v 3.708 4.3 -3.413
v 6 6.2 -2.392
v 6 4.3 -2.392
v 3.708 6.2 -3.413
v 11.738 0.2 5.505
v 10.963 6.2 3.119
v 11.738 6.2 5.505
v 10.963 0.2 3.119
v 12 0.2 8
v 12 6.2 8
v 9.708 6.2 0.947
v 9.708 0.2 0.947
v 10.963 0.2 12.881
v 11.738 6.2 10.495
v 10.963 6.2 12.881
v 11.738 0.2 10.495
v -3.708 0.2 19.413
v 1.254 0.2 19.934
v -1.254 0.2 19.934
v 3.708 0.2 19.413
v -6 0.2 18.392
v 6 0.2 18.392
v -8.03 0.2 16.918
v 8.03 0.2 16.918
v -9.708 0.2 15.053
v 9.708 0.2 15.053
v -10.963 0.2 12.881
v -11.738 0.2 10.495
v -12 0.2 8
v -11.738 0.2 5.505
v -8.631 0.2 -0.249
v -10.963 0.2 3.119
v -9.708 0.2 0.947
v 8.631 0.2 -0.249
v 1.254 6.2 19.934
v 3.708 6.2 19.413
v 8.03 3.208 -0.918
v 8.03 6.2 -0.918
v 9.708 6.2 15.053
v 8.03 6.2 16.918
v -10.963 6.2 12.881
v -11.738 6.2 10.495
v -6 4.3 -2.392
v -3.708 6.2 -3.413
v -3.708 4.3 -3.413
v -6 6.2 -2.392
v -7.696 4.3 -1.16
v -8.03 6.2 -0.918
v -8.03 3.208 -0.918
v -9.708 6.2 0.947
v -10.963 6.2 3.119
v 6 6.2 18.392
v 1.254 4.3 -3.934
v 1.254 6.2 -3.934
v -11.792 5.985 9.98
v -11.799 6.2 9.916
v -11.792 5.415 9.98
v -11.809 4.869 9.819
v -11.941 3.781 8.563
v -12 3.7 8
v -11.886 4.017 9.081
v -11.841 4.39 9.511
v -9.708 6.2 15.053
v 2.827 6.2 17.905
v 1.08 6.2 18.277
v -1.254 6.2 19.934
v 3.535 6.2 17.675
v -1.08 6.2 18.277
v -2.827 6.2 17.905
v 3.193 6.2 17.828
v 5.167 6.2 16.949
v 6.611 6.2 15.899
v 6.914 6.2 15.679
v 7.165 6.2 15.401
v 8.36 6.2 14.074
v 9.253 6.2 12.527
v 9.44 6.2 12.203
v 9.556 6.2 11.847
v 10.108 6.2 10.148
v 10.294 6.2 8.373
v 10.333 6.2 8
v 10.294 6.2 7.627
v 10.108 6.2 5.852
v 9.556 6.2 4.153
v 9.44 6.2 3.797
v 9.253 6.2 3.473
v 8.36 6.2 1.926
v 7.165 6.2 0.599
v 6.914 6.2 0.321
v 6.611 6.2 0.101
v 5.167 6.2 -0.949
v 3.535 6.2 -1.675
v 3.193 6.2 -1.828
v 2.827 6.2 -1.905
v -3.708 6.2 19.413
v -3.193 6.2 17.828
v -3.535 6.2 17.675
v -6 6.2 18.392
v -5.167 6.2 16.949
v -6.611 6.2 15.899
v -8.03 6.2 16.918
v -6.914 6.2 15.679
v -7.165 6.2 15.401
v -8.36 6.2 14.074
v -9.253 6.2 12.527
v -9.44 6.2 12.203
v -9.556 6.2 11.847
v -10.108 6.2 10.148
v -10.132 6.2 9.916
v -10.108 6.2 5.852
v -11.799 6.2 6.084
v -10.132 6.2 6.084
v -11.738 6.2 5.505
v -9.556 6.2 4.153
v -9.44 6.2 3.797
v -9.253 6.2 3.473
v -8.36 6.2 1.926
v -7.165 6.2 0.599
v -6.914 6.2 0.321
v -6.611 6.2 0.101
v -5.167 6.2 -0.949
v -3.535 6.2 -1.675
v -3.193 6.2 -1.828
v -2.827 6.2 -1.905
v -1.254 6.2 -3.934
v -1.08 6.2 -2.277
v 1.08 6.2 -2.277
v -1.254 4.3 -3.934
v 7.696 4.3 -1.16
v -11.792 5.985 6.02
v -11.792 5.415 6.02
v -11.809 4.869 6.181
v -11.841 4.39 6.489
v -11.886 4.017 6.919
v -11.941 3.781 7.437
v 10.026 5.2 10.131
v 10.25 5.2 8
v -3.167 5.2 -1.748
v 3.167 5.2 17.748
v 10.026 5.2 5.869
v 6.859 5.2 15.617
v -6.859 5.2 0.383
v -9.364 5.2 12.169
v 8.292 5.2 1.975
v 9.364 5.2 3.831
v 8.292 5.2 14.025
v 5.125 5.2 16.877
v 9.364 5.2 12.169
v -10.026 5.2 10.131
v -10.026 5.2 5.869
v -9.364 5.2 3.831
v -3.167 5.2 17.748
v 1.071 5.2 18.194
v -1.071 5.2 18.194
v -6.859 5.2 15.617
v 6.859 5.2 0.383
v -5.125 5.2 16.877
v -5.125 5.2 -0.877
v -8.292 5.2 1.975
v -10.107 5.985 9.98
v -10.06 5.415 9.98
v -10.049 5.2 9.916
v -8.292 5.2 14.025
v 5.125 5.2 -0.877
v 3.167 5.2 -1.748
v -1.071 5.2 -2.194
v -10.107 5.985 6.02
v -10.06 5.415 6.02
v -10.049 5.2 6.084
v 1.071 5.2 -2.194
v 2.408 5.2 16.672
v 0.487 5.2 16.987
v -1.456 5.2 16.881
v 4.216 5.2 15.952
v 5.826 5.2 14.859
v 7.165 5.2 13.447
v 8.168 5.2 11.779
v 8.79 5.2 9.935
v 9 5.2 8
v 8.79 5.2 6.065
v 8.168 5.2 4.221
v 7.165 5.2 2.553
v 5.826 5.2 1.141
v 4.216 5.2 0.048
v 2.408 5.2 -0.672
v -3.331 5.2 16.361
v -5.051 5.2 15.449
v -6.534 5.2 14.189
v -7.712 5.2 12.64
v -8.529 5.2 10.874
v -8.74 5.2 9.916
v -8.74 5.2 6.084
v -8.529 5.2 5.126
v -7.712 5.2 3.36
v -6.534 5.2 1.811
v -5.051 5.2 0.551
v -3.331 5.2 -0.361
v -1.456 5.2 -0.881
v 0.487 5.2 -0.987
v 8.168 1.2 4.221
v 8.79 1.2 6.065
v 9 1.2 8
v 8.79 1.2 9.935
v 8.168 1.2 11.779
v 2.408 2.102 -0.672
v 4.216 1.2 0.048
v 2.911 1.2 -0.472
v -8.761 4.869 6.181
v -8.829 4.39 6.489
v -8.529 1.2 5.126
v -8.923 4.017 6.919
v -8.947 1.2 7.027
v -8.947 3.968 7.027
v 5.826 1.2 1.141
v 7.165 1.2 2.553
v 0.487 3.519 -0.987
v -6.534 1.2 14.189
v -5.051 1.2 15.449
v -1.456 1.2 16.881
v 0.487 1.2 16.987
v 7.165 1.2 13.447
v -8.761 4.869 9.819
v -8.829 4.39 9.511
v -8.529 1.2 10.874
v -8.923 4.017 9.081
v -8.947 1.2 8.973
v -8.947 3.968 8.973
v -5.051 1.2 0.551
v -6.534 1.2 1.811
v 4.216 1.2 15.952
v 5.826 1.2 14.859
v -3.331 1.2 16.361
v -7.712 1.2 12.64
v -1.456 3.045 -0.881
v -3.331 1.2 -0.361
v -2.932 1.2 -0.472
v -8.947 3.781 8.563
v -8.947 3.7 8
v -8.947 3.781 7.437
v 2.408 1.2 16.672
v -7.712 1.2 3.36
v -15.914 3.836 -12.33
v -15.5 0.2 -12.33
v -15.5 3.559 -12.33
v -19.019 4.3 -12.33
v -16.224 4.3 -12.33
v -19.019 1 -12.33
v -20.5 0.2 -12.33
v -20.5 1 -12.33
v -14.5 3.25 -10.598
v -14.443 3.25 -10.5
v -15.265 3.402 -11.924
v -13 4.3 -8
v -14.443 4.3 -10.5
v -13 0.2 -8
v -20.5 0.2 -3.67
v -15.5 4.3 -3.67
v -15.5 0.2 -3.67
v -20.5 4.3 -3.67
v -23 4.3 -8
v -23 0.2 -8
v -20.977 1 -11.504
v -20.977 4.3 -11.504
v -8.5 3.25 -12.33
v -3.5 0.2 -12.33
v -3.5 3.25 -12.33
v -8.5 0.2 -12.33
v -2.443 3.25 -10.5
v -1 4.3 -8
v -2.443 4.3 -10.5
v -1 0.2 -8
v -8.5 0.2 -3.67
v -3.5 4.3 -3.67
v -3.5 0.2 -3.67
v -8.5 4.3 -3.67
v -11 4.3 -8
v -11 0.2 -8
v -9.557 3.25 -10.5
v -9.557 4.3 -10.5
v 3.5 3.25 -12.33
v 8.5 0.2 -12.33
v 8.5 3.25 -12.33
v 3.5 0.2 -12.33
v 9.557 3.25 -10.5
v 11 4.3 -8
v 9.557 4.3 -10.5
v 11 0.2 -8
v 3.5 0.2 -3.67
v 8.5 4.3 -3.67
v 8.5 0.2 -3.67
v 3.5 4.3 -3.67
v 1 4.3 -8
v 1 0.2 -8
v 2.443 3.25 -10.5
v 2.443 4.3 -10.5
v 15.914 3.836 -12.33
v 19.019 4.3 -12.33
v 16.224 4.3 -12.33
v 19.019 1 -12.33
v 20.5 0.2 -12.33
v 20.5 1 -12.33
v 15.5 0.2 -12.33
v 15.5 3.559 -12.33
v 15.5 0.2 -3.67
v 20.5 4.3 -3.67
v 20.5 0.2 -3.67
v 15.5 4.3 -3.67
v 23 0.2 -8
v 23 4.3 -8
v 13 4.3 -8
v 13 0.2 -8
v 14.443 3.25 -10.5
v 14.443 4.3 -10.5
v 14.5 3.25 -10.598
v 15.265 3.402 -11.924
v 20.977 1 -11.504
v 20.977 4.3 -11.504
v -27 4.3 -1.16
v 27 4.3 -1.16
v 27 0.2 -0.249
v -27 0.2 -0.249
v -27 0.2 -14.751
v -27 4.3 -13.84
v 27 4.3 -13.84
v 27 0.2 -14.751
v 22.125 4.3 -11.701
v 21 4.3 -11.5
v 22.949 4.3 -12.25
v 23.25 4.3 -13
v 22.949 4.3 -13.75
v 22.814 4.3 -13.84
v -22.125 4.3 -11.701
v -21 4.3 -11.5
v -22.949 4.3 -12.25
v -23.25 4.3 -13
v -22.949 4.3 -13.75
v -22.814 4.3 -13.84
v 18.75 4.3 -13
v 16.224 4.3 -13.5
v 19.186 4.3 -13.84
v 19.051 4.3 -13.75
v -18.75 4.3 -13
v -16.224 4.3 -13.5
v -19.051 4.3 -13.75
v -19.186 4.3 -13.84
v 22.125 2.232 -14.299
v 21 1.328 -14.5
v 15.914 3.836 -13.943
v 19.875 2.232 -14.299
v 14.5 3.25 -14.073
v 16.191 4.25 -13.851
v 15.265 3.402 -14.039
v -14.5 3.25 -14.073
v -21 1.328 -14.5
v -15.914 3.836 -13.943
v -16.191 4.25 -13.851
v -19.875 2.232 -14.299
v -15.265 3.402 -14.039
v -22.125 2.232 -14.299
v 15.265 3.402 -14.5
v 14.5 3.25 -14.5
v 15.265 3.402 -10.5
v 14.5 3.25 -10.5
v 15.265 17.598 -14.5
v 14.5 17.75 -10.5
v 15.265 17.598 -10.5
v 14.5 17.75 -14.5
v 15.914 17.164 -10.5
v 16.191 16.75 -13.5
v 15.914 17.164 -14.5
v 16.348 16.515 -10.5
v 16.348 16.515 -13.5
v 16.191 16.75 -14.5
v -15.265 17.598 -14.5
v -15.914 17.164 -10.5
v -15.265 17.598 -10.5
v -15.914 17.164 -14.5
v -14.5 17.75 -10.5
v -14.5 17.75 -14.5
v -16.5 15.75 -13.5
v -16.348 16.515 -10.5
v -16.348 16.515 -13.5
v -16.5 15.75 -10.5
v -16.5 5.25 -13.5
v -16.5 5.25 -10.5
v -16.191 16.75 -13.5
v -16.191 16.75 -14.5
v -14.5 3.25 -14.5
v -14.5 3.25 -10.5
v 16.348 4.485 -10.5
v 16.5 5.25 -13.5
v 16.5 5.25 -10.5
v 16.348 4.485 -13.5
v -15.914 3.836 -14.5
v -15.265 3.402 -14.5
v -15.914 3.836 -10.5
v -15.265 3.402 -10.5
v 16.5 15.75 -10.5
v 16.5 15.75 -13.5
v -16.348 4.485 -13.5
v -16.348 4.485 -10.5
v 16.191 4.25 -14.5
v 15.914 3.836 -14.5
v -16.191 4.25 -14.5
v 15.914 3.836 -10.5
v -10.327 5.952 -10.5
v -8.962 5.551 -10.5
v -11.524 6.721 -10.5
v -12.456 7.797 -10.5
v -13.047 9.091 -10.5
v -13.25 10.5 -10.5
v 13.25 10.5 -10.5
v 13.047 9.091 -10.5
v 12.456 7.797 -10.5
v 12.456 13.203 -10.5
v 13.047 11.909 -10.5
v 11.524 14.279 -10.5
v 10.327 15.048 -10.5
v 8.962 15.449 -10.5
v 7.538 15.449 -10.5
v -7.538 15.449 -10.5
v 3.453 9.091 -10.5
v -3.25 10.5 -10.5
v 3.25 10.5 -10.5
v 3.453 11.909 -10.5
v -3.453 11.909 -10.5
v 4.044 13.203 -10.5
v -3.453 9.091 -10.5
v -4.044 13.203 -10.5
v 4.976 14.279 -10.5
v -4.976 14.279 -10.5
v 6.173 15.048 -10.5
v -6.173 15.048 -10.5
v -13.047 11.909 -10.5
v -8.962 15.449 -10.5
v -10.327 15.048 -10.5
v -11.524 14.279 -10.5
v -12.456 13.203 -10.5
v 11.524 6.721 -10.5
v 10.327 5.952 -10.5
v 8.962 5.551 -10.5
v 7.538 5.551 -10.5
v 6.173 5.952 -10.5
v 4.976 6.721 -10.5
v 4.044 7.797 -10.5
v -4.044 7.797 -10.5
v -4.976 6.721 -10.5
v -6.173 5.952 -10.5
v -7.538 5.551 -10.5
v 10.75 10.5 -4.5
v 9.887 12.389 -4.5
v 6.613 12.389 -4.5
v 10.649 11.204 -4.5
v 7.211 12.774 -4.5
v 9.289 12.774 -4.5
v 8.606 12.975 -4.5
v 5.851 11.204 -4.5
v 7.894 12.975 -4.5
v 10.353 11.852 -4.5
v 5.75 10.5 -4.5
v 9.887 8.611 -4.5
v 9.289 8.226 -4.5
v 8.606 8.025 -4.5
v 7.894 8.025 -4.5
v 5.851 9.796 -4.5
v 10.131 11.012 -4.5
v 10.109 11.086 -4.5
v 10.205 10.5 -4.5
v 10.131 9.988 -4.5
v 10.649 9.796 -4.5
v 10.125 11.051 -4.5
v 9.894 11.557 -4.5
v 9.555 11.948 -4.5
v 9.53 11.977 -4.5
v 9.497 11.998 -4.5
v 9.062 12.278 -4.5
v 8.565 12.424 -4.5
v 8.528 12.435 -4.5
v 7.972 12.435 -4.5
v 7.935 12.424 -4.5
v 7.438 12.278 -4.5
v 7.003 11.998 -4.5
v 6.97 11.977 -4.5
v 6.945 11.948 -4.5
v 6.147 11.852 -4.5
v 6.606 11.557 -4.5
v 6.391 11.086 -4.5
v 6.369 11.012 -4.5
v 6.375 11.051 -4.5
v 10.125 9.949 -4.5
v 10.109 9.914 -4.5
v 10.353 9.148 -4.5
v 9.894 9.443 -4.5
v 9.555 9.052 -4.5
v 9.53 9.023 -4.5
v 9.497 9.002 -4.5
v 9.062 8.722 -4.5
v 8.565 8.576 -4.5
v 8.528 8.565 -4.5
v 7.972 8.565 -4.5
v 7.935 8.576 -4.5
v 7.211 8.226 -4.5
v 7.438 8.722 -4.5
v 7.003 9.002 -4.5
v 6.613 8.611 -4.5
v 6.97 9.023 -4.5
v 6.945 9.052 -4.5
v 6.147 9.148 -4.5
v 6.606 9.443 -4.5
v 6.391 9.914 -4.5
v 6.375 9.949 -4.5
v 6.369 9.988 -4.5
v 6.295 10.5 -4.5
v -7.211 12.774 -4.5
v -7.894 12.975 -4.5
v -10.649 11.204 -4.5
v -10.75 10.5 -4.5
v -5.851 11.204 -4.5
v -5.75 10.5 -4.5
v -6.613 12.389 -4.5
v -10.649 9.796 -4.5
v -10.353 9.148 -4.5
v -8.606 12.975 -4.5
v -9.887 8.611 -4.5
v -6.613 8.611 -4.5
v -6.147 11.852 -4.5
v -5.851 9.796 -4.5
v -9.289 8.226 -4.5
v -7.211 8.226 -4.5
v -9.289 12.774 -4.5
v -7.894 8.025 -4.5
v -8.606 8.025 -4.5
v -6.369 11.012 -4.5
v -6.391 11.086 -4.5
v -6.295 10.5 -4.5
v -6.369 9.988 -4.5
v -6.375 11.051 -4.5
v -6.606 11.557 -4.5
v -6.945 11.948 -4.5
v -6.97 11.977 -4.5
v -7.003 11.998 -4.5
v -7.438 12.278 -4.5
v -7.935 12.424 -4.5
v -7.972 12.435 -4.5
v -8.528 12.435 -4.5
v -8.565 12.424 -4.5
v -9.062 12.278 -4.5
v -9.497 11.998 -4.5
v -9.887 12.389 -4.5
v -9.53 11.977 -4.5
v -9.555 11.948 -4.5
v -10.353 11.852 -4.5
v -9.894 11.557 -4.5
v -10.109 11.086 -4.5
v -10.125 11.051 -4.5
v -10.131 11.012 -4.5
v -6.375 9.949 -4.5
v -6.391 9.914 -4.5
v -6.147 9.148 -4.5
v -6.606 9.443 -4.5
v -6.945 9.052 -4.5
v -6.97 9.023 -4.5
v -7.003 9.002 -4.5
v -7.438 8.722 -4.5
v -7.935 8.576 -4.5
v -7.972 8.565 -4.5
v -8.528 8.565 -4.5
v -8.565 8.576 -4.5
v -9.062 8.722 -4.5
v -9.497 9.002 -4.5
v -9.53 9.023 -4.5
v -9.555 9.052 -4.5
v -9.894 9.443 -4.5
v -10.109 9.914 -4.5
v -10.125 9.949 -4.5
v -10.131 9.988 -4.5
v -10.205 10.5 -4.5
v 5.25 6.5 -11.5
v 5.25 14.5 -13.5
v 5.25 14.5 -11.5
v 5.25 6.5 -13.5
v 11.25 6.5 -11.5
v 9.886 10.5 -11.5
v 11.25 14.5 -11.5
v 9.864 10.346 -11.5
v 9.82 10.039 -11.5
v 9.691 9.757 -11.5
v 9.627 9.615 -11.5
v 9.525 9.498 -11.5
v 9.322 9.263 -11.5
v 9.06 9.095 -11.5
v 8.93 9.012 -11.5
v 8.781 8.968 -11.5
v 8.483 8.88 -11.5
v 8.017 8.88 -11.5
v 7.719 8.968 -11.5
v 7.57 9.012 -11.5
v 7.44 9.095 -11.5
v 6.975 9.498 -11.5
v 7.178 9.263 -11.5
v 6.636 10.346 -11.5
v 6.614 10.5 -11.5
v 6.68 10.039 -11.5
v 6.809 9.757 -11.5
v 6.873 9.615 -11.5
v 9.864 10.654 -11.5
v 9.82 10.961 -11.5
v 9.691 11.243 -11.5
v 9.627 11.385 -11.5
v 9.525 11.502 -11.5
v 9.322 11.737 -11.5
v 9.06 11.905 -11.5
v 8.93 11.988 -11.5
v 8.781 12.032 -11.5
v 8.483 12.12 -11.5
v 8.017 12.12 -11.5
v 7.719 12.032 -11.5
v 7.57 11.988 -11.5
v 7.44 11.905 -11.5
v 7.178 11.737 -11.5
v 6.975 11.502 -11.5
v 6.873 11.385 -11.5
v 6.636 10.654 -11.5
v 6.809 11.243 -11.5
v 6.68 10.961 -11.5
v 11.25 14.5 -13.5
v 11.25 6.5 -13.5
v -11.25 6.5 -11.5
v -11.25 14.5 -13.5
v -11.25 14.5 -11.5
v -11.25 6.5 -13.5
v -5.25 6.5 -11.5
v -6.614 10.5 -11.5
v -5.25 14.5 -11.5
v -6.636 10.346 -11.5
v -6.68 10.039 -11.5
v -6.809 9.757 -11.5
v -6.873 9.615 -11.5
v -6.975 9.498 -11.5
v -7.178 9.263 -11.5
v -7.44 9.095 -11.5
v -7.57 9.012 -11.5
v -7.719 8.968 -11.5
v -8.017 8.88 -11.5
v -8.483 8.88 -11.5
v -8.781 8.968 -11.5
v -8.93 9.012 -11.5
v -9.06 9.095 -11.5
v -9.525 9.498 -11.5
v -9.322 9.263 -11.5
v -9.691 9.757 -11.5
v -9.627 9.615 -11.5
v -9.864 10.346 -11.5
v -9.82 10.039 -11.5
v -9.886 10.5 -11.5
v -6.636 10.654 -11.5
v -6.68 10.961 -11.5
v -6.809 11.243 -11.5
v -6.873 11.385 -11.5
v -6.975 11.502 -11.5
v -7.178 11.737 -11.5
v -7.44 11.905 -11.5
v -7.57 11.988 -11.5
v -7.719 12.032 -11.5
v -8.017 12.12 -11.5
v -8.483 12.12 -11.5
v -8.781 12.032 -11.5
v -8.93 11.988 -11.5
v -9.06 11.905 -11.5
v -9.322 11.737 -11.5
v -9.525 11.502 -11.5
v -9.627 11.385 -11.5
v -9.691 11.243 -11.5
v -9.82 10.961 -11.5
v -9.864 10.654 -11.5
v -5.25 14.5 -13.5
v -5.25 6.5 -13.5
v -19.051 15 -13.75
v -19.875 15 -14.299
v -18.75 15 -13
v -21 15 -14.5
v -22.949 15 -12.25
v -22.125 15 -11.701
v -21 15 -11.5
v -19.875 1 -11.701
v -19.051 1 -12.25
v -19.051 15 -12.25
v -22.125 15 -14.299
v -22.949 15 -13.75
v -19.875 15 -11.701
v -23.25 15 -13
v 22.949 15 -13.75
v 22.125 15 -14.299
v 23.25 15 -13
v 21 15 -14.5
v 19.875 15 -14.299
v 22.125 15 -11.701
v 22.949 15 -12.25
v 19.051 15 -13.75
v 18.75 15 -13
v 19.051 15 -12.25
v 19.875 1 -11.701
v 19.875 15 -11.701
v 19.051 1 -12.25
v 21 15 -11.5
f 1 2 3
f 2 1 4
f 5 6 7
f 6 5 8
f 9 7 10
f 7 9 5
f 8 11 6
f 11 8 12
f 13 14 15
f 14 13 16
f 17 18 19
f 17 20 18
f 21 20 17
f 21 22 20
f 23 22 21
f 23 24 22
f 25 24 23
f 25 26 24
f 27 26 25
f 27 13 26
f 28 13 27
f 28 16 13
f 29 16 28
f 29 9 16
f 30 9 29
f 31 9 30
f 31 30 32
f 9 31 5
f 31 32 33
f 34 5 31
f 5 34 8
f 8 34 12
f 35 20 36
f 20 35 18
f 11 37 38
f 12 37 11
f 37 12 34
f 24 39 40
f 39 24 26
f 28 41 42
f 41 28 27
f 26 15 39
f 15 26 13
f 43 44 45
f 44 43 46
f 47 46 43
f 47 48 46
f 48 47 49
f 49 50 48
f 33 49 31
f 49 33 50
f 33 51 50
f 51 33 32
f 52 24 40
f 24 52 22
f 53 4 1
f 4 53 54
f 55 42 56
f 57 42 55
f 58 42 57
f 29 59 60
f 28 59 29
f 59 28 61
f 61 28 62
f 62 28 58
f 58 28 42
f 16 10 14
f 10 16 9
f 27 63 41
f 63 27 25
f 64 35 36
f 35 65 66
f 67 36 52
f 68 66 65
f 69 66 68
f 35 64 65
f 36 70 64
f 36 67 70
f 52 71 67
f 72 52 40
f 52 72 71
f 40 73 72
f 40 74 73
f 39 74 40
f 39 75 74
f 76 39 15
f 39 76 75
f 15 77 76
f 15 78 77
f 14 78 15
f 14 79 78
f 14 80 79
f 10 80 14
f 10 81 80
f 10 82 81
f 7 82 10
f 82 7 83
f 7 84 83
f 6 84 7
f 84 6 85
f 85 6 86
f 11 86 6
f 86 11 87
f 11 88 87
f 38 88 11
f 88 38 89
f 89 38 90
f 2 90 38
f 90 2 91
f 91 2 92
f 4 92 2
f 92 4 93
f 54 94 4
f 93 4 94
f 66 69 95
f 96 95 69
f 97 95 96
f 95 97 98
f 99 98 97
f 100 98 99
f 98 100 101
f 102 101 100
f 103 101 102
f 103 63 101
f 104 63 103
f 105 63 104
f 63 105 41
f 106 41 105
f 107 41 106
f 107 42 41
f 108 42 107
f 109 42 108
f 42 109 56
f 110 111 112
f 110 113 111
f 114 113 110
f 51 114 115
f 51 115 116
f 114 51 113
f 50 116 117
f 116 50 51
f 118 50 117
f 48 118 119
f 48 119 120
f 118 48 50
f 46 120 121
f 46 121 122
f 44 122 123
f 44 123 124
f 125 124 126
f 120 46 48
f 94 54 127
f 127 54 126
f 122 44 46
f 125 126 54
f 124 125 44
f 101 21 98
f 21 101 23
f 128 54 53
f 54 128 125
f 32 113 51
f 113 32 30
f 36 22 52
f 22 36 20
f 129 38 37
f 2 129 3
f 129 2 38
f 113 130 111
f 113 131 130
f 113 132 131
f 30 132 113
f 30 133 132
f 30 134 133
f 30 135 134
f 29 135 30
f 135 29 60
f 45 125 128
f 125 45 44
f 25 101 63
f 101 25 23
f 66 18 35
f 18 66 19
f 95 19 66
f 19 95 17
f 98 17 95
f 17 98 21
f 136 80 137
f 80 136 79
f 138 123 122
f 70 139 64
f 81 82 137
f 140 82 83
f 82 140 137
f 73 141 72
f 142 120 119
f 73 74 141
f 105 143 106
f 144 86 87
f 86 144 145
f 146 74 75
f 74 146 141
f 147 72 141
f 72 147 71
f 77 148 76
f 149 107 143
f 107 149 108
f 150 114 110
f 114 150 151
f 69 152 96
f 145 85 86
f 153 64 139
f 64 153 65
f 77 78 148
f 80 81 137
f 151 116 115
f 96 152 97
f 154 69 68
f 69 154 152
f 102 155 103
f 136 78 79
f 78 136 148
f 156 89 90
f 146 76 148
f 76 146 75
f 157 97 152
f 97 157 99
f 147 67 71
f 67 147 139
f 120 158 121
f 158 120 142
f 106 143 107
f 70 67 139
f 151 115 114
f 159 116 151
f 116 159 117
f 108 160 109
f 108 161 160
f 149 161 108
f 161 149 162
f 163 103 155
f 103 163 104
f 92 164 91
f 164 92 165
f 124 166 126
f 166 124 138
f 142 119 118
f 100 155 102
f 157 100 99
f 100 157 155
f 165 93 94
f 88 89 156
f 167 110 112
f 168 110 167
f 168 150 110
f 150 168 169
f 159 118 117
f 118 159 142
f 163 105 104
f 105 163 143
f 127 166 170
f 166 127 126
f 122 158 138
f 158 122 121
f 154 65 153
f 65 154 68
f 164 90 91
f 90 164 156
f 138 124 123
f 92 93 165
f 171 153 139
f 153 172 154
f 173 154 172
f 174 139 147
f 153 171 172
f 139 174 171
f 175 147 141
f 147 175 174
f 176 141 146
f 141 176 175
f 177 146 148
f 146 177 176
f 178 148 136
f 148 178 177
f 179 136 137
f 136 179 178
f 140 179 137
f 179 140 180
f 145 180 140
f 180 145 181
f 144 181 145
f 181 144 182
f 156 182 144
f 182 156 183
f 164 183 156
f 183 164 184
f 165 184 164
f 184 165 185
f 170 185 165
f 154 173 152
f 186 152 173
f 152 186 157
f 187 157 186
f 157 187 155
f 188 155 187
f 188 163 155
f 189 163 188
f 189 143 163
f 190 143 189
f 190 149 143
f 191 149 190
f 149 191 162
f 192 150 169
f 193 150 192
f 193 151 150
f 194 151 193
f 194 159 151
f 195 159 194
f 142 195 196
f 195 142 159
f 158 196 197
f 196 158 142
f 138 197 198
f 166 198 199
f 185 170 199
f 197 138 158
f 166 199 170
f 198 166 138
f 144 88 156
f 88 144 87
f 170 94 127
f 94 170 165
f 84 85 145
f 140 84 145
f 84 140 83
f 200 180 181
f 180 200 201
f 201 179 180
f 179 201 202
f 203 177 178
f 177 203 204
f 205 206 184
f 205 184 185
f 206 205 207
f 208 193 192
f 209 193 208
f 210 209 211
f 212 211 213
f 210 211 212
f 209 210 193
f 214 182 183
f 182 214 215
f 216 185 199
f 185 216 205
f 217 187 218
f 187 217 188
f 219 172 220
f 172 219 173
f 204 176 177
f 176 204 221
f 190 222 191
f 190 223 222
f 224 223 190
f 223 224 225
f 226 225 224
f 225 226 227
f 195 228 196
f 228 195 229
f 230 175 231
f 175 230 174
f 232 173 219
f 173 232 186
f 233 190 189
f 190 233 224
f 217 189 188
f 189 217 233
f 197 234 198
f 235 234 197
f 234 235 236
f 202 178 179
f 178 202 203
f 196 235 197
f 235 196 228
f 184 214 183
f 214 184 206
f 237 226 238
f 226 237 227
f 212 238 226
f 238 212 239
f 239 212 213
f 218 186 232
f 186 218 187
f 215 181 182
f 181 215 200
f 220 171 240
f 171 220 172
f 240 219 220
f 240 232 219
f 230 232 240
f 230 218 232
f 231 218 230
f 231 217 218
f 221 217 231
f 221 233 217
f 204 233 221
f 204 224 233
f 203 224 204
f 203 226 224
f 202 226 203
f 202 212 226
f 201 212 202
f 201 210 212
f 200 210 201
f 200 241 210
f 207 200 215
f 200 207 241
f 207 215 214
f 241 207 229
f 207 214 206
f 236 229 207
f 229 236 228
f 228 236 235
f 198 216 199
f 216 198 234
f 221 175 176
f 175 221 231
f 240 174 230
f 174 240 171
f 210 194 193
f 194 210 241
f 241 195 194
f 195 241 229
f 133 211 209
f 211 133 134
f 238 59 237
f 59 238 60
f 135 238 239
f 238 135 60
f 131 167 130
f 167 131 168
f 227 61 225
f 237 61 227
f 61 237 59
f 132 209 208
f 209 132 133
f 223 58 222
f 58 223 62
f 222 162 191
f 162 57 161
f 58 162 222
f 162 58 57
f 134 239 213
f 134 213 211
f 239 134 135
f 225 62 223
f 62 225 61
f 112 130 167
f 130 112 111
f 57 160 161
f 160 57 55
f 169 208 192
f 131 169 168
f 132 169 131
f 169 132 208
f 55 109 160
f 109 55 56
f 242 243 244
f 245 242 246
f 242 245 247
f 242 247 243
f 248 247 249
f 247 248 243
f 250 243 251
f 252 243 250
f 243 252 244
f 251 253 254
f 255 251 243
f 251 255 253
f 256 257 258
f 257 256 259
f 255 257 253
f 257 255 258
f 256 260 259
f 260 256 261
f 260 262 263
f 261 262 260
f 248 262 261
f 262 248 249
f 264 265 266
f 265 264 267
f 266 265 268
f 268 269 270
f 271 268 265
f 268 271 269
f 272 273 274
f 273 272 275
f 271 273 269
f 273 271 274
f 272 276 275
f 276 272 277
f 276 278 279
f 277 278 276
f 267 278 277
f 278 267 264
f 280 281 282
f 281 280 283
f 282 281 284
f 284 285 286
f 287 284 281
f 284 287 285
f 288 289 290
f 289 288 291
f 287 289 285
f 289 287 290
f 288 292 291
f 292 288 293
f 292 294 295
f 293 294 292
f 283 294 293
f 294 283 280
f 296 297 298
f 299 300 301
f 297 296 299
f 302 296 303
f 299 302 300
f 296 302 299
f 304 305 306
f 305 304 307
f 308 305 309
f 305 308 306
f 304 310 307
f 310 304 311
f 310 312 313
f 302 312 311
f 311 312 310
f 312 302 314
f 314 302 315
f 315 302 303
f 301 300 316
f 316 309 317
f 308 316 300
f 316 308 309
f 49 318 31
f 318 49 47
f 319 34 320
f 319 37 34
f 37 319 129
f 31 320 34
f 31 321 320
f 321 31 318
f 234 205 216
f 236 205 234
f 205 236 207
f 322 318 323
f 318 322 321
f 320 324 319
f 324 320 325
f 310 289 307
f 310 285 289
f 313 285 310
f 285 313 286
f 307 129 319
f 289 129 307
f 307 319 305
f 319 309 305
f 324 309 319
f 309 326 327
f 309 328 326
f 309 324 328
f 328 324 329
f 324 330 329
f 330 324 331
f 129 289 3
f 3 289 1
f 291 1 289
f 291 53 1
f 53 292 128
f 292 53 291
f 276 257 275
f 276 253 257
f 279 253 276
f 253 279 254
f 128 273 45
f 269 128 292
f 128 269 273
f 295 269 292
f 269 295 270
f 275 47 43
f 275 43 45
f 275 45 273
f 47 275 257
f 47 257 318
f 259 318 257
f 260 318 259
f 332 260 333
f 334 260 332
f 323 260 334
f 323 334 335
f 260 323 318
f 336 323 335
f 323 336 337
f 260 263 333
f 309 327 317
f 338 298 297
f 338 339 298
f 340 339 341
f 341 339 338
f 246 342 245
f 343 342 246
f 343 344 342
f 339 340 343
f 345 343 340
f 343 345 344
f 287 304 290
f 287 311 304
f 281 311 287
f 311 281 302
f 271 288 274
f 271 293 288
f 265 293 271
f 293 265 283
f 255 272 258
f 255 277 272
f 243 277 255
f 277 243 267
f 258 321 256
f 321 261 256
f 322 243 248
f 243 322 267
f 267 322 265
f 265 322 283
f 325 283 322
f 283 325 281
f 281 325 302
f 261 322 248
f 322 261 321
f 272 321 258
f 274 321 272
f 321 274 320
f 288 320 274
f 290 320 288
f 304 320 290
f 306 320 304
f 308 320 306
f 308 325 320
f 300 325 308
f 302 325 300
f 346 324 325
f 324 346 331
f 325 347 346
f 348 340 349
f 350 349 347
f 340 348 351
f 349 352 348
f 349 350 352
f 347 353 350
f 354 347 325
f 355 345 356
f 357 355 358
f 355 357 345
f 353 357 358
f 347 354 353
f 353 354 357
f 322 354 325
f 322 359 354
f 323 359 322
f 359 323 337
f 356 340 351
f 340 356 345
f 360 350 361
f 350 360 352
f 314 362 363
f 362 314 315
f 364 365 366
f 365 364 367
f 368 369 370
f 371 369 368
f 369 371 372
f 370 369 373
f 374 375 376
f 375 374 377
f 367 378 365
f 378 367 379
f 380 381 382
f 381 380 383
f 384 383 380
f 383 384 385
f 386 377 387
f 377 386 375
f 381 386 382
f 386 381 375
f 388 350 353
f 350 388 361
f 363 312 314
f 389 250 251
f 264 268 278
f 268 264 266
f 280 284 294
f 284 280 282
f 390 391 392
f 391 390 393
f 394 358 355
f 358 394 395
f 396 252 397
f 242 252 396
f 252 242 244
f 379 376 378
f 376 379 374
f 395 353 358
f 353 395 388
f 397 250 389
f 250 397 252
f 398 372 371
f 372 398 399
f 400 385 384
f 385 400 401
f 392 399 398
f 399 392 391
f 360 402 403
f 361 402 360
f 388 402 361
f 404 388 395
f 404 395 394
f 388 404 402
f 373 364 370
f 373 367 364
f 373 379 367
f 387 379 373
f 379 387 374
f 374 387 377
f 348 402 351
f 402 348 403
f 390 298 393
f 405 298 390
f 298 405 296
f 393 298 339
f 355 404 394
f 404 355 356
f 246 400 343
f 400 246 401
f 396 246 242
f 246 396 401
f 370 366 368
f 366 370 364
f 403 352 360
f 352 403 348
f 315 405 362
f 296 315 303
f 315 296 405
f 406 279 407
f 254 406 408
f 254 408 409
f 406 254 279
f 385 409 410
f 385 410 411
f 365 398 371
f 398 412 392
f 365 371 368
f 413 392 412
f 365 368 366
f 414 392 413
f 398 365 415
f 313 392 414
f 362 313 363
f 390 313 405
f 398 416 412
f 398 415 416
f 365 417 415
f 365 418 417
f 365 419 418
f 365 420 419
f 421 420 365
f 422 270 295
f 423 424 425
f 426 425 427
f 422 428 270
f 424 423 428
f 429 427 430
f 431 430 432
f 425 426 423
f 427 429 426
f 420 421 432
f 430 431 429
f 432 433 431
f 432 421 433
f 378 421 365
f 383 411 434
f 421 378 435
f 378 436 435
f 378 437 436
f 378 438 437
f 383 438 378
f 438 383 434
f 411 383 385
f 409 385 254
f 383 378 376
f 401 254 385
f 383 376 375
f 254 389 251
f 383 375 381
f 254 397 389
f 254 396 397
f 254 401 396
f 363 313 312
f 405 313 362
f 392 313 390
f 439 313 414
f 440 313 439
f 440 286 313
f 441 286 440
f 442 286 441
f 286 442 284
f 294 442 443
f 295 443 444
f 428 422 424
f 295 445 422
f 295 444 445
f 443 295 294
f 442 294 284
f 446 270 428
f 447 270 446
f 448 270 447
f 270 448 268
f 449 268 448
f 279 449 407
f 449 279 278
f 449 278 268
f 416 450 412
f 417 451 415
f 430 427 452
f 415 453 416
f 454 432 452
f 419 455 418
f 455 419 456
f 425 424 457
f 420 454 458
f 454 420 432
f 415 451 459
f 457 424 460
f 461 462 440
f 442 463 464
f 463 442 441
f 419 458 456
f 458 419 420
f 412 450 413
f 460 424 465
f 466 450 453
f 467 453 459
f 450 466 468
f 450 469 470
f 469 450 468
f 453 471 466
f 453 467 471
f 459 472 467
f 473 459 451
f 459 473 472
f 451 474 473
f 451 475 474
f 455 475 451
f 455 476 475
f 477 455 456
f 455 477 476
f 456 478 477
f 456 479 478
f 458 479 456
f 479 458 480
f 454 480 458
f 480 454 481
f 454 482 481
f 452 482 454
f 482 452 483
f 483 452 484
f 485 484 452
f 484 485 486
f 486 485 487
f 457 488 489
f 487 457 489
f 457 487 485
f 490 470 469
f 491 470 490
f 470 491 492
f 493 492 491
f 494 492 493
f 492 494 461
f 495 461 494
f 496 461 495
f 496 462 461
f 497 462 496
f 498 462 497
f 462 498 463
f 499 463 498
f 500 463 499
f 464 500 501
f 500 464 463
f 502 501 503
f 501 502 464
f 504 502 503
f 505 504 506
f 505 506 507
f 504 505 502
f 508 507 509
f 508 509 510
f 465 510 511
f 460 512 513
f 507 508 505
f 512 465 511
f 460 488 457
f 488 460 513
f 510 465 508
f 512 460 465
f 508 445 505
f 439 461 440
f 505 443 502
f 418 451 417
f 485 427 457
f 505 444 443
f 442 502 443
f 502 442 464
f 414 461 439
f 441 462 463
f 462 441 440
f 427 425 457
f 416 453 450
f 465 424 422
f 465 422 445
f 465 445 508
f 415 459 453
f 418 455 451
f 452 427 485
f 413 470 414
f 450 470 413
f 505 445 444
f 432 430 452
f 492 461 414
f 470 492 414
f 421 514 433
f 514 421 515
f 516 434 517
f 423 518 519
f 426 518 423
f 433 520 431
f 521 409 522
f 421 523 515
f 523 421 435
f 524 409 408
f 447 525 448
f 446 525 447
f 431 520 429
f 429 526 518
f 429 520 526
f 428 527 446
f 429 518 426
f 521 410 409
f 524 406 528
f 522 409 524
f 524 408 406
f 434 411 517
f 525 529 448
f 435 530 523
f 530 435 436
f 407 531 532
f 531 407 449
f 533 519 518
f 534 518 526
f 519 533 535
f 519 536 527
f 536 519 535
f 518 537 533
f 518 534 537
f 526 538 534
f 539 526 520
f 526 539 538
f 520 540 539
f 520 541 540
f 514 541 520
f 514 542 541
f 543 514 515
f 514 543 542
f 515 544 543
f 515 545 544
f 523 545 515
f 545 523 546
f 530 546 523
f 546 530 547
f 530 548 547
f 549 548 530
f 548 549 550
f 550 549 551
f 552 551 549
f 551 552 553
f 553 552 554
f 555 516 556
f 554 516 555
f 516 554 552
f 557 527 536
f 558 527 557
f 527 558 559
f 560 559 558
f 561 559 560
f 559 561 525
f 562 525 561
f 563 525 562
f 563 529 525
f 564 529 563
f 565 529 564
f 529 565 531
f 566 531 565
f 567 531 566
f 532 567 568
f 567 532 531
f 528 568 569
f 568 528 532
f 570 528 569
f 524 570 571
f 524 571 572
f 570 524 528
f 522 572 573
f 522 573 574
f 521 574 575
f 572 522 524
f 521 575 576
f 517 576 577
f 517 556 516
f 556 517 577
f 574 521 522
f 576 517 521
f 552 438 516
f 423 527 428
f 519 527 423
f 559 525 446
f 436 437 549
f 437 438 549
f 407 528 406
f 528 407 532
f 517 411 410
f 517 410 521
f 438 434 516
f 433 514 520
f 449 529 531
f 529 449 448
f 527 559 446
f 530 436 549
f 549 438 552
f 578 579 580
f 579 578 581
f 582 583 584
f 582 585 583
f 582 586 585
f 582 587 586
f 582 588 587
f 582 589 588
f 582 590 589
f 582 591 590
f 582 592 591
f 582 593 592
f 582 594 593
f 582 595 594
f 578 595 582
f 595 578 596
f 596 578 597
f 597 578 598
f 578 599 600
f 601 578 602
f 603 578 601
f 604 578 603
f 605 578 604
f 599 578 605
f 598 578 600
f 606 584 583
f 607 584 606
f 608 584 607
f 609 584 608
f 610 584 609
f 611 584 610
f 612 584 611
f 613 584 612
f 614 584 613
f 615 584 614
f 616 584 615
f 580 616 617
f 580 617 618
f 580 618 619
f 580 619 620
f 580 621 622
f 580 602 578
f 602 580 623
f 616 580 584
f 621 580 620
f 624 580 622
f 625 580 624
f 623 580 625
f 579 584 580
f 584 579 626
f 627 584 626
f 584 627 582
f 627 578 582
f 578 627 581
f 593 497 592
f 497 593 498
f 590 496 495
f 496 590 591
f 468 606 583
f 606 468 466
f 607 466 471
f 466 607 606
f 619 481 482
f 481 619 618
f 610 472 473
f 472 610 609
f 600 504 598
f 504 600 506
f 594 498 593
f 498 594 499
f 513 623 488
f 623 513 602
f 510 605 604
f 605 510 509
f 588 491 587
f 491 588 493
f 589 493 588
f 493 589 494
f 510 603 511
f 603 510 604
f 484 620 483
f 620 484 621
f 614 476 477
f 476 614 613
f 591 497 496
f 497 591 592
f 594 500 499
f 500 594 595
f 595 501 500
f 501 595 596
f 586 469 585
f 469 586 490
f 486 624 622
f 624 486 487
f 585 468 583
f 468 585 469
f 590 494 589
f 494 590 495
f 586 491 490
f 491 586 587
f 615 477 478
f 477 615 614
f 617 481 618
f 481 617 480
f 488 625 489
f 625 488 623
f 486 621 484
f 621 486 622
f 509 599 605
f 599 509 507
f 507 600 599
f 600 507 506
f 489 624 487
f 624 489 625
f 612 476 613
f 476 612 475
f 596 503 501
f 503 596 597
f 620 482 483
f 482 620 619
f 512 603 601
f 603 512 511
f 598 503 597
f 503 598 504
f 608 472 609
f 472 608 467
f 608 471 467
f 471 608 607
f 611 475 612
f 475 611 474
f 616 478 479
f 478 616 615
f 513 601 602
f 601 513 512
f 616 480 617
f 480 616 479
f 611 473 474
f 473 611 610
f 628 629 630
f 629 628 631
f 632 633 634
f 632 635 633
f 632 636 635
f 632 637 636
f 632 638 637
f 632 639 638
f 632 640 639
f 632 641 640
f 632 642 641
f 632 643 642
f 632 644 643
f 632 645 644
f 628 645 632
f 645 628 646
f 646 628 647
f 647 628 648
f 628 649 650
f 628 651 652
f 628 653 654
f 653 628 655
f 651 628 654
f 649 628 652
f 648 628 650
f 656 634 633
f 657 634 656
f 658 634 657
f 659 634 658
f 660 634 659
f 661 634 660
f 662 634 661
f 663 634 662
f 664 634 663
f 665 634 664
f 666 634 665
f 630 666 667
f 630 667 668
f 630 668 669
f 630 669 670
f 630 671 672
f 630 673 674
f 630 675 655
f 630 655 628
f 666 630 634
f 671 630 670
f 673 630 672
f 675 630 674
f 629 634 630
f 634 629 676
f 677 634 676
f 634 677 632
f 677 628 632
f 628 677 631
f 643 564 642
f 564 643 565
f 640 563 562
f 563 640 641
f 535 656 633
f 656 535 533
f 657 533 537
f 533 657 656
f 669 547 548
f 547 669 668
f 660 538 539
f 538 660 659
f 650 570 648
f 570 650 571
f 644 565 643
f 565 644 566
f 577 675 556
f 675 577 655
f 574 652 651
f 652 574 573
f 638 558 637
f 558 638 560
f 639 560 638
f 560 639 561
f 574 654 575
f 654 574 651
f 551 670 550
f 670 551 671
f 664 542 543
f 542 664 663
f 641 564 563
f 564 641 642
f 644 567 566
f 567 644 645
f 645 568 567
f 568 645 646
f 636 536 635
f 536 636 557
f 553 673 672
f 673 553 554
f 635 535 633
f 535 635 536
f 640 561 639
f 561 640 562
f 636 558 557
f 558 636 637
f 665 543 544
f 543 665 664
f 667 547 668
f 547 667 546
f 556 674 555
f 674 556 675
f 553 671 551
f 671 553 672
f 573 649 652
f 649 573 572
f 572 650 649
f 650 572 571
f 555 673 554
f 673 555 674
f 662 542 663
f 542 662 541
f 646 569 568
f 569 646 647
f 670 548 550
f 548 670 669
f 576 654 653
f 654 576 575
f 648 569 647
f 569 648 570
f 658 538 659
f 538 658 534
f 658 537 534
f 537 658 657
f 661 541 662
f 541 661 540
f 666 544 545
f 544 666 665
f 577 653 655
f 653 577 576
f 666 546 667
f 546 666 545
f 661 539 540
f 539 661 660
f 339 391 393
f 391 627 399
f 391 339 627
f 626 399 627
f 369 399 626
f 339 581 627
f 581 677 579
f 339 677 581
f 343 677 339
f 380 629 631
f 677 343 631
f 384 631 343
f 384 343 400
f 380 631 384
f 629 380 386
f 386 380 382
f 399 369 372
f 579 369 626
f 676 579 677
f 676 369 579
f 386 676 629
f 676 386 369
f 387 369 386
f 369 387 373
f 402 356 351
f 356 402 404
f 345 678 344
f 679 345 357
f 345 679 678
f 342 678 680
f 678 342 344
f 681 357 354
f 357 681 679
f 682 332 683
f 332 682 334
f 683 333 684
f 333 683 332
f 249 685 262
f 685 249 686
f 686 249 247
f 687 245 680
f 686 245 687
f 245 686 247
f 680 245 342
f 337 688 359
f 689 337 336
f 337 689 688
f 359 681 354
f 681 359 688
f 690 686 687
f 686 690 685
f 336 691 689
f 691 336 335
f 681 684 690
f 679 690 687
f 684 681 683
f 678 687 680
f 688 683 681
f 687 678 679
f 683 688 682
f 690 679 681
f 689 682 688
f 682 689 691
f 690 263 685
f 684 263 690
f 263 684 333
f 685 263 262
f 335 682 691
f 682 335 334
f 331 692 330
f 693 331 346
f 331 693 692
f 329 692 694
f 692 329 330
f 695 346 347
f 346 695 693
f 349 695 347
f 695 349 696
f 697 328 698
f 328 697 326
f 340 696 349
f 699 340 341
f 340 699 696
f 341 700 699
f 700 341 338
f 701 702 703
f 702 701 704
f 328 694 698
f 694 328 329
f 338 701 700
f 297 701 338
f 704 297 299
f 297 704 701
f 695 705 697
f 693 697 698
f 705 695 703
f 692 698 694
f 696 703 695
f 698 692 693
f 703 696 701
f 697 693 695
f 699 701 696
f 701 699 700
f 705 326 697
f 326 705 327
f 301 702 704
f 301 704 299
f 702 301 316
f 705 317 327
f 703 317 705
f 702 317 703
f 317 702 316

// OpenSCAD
// BB-3c
// This is the mount for LED strip

tol=0.25;
extra=4;
/*
//-----------------------
// Piezo
translate([0,3,0]) rotate([-90,-90,0])
color("orange"){
    union(){
        cylinder(r=10,h=0.2);
        cylinder(r=8,h=1);
        translate([0,-7,0.5])
        rotate([90,0,0]) cylinder(r=0.5,h=8);
        translate([1,-7,0.5])
        rotate([90,0,0]) cylinder(r=0.5,h=8);
    }
}
*/
/*
//-----------------------------------
// Horn
translate([0,7,8]) rotate([-90,0,0])

union(){
H=8; // height total
K=4;    // how fast to neck down
J=0.5;  // eccentricity
L=45;    // rotation
Y=0;    // y-axis offset

for(i=[0:99]){
    translate([0,Y*i/100,H*i/100])
    rotate([L*i/100,0,0])
         scale([1-J*i/100,1,1]){
     difference(){
         cylinder(r=12-K*i/100,h=0.4);
         cylinder(r=10-K*i/100,h=0.8,center=true);
     }
 }
 }

translate([0,-30,8])
rotate([90,0,180])

color("pink"){
H2=30; // height total
K2=4;    // how fast to neck down
J2=.5;  // eccentricity
J3=.5;  // eccentricity
L2=45;    // rotation
Y2=0;    // y-axis offset

for(i=[0:99]){
    translate([0,Y2*i/100,H2*i/100])
    rotate([L2*i/100,0,0])
         scale([1-J2*i/100+J3*(99-i)/100,1-J3*(99-i)/100,1]){
     difference(){
         cylinder(r=12-K2*i/100,h=0.4);
         cylinder(r=10-K2*i/100,h=1,center=true);
     }
 }
 }
}




// attachment to base
    translate([0,0,-3])
    difference(){
        cylinder(r=14,h=3.5);
        cylinder(r1=12,r2=9,h=3.6);
        cylinder(r1=12,r2=12,h=2.0);
    }
    
    
}   // end of union

// Number tag
    translate([0,19.0+3,28]) rotate([90,0,0]){
        difference(){
        cylinder(r=8,h=1);
    
    translate ([-0.5,-0.5,0.5]) color("red") rotate([0,180,0])
    linear_extrude(height=1.0){
    text("7", font = "Open Sans:style=Bold", size=8,halign="center",valign="center",spacing=1.1);
    }
}
}
*/

//-------------------------------------
// backshell
translate([0,0.2,8]) rotate([-90,0,0])
color("green"){
    difference(){
        cylinder(r=12,h=6);
        translate([0,0,5]) cylinder(r1=10.25,r2=10.75,h=6);
        translate([0,0,1]) cylinder(r=9,h=6);
        translate([-18,0,5.5]) rotate([0,90,0]) cylinder(r=2,h=10,$fn=22);
    }
}

//-------------------------------
// Crossbar

    difference(){
    // Cutouts in the bottom outer rail to support fiber crossbar
        ps1=[ [0,0], [15,0], [14,4.5], [1,4.5] ];
        translate([-27,0,0]) rotate([0,90,0])
        linear_extrude(height=54) offset(r=-0.2) polygon(points=ps1);
i=0;
N=4;
    for(i=[0:1:N-1])
        translate([-18+12*i,0,-8]) 
        rotate([90,0,0]) cylinder(r=5,h=10,center=true,$fn=6);
}

//----------------
// LED support
translate([0,10.5,-14.5]) //rotate([-90,0,0])
difference(){
    union(){
        // Main bar
        linear_extrude(height=2,scale=1) 
        offset(r=2,$fn=16) offset(r=-2,$fn=16)
        square(size=[33,14.5],center=true);

        translate([0,0,2])    
        linear_extrude(height=2,scale=1) 
        offset(r=2,$fn=16) offset(r=-2,$fn=16)
        square(size=[33,14.5],center=true);
        
    translate([16.5/2,0,4]) cylinder(r1=5,r2=2.5,h=6,$fn=22);
    translate([-16.5/2,0,4]) cylinder(r1=5,r2=2.5,h=6,$fn=22);
    
    }
    
    // Channel for tape
    translate([0,0,-1])
    linear_extrude(height=2) square(size=[54,12.5],center=true);
    
    // Cutouts for LED bodies and fibers
    translate([16.5/2,0,0]){
        linear_extrude(height=3) square(size=[6,8],center=true);
        cylinder(r1=1.5,r2=2,h=11,$fn=22);
    }

    translate([-16.5/2,0,0]){
        linear_extrude(height=3) square(size=[6,8],center=true);
        cylinder(r1=1.5,r2=2,h=11,$fn=22);
    }

}

// add support for the wires off the strip
    color("pink")
    translate([-21,1,-13])
    rotate([-90,0,0])
    scale([1.5,1,1])
    cylinder(r=1.5,h=14,$fn=12);

    color("pink")
    translate([21,1,-13])
    rotate([-90,0,0])
    scale([1.5,1,1])
    cylinder(r=1.5,h=14,$fn=12);
